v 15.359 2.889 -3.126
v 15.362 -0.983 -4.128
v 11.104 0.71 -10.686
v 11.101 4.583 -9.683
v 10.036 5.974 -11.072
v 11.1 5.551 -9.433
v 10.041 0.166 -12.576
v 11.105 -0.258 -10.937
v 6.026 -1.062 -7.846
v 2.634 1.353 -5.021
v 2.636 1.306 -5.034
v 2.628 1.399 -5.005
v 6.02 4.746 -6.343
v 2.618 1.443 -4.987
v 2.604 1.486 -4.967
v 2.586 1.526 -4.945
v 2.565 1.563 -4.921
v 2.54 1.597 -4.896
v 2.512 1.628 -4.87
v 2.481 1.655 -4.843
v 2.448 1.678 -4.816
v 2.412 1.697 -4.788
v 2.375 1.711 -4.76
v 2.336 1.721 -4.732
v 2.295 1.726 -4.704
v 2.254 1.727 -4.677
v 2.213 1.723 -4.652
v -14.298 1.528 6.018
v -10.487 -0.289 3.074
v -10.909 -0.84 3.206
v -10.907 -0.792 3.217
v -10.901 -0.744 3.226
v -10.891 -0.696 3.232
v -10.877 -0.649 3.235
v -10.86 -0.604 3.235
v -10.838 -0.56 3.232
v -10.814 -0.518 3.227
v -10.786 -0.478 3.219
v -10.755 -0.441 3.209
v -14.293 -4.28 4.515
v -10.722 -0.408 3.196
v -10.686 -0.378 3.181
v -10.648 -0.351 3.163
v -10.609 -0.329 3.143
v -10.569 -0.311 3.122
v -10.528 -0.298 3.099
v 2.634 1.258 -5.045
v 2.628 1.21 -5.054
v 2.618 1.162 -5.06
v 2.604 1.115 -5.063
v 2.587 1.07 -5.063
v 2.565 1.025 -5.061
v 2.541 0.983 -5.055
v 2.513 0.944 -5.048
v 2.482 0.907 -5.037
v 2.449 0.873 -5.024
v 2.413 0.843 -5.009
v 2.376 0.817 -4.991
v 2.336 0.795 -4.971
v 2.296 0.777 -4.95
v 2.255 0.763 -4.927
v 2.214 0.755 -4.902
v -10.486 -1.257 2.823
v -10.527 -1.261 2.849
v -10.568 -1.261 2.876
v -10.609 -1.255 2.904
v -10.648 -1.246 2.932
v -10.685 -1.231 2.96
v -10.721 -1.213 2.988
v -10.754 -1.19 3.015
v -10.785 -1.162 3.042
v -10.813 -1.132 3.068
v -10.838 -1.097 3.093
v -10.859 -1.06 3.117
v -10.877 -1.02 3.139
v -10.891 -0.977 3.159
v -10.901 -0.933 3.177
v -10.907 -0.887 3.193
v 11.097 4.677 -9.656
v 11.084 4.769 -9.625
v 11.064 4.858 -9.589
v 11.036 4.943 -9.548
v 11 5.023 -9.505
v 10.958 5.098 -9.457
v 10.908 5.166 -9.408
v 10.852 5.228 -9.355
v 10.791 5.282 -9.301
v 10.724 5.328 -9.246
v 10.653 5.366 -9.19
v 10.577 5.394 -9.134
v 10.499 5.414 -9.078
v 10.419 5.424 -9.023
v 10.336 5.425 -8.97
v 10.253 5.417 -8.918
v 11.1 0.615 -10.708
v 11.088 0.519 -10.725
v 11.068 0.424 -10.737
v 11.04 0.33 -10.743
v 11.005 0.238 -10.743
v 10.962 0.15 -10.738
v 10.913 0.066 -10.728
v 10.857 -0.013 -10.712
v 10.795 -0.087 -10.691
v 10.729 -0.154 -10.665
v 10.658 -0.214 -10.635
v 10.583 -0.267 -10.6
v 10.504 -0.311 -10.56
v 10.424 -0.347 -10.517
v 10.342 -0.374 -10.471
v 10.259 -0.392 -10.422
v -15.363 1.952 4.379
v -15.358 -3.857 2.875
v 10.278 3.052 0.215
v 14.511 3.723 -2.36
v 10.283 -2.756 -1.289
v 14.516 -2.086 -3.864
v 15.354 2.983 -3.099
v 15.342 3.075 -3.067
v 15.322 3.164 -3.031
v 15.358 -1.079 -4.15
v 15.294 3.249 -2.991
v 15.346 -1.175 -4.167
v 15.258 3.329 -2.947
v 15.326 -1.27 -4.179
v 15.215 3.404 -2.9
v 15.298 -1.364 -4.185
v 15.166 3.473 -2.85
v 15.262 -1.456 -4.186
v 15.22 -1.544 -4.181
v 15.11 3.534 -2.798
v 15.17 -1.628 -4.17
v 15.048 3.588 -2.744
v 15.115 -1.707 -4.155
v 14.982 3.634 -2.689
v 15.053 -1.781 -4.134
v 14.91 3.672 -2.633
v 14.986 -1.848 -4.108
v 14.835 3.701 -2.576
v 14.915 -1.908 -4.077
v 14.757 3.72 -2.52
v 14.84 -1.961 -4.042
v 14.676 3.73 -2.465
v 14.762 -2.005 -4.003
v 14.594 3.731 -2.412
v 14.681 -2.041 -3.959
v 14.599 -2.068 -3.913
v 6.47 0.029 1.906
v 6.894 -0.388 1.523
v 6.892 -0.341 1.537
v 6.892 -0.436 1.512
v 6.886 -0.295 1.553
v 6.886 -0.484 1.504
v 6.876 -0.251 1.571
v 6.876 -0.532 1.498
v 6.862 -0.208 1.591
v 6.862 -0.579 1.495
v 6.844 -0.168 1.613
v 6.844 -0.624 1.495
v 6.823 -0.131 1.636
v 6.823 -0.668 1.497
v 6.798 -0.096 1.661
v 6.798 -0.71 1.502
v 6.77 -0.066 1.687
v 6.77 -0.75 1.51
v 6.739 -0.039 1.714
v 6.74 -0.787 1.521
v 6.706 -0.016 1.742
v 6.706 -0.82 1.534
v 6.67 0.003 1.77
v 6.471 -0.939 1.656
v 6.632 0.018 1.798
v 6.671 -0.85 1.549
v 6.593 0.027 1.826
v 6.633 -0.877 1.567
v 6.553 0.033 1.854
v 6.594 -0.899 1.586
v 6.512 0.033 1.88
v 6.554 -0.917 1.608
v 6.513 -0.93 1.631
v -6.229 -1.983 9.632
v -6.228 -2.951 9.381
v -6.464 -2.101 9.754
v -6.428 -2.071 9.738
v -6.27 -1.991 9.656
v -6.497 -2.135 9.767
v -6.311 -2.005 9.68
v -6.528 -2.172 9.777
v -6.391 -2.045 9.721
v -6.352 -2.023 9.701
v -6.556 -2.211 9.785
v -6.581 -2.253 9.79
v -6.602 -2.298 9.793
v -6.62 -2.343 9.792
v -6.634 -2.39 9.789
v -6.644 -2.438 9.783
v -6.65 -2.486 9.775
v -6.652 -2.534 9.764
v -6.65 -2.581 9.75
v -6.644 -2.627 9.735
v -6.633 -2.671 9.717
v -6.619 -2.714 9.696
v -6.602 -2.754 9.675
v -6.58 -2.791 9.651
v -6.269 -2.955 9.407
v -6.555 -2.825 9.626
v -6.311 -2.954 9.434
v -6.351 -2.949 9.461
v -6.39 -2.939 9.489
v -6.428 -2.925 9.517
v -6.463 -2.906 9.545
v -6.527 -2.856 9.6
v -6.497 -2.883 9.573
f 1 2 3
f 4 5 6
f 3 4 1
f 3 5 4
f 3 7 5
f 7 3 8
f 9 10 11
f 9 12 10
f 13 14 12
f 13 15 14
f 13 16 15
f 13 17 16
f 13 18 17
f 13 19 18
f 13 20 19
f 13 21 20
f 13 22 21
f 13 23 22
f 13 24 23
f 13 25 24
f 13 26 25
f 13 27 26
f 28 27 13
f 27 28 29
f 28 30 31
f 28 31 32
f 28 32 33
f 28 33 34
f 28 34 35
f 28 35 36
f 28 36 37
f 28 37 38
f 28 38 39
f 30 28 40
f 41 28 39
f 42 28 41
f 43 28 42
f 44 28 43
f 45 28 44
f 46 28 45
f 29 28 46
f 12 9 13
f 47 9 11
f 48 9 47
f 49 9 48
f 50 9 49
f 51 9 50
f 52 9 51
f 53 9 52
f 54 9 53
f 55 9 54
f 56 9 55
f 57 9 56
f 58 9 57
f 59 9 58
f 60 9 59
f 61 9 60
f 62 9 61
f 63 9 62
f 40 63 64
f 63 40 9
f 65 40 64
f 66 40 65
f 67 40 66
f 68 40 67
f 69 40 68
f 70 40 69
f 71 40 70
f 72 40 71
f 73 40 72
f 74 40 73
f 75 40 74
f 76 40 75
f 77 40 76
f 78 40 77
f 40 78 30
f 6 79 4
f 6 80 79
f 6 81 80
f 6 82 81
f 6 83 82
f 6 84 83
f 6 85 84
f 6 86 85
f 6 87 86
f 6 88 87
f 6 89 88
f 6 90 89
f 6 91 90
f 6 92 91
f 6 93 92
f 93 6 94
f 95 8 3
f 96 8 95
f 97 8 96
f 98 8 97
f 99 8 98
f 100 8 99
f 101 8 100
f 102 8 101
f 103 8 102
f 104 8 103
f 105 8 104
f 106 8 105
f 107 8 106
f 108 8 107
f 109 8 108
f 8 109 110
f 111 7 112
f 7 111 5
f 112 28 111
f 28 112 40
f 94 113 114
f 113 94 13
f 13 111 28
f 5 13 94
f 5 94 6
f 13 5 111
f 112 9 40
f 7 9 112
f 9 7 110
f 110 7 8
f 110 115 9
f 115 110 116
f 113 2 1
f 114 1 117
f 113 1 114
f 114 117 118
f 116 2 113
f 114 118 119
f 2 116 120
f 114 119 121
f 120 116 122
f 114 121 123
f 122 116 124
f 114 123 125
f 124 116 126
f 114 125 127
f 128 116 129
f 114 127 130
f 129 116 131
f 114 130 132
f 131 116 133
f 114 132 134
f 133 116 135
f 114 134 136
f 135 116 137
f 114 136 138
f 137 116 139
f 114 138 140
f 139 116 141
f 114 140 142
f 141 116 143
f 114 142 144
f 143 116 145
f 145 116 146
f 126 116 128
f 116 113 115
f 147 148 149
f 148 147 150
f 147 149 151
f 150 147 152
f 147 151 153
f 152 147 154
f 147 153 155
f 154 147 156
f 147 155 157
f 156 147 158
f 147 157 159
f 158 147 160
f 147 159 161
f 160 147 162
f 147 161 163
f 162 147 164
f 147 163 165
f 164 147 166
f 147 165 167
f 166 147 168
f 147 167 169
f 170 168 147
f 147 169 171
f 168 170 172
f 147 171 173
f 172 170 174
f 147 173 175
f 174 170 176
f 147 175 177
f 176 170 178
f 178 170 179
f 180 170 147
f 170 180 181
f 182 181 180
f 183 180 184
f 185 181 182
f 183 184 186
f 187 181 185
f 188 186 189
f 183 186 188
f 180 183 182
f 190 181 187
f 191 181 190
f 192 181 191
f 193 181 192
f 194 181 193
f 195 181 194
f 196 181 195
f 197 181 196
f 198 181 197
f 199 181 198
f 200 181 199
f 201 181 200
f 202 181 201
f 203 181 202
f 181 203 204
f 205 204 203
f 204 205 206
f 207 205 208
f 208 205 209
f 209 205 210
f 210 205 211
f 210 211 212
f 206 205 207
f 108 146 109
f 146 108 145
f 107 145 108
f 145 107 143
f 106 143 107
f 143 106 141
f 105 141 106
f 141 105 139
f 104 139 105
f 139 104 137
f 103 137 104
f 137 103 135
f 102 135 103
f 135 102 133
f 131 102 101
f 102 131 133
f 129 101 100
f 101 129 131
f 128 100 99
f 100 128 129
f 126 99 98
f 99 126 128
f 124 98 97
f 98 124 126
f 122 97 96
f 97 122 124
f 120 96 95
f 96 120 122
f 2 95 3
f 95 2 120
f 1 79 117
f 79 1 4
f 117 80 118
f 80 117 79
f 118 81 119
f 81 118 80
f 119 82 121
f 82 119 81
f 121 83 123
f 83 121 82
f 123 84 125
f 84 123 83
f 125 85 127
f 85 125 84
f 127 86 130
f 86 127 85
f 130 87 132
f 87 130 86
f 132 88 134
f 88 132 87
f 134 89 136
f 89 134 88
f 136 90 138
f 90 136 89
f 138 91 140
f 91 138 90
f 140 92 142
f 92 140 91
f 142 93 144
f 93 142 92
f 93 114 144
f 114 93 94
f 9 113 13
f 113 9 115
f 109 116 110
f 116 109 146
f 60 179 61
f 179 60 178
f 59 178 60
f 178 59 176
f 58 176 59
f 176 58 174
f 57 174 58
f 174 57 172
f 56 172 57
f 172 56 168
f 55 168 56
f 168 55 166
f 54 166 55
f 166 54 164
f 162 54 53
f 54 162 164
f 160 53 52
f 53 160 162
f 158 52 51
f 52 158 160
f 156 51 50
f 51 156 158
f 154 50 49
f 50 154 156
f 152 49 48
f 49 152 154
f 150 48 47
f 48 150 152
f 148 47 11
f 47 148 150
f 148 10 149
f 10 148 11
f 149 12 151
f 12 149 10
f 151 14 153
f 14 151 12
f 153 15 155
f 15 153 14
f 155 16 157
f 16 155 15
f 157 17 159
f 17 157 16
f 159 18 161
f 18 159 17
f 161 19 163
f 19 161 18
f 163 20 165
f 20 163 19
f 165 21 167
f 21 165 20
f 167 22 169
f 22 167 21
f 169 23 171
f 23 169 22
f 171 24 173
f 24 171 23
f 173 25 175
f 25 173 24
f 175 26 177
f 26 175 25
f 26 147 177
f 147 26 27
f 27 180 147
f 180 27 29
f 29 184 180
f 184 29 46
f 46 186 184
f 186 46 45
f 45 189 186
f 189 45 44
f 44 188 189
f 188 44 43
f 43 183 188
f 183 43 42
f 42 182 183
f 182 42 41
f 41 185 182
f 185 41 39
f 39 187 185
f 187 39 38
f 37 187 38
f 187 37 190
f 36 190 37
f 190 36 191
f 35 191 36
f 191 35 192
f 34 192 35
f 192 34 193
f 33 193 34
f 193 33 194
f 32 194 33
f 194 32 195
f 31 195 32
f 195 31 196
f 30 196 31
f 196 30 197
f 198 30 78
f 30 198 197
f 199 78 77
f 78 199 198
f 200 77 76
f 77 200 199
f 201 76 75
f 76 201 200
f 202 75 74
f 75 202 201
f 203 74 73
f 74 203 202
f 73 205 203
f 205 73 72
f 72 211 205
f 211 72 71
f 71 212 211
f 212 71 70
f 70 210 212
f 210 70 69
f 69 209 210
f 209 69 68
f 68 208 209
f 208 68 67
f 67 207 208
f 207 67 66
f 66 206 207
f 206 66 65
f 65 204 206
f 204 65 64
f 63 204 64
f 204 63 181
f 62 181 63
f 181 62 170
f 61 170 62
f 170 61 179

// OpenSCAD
// file: stepped_bar.scad
// Lower bar is rectangular; the head's two free-end corners round above it.
// Rib x bounds are its OUTER stadium bounds, including both half-round ends.
$fn = 64;
body_length = 30;
body_width = 6;
head_length = 6;
step_1_height = 2;
step_2_height = 10;
corner_1_radius = 1;
corner_2_radius = 1;
corner_3_radius = 0.5;
corner_4_radius = 0.5;
rib_start = 4;
rib_end = 20;

module stepped_bar(body_length=30, body_width=6, head_length=6,
                    step_1_height=2, step_2_height=10,
                    corner_1_radius=1, corner_2_radius=1,
                    corner_3_radius=0.5, corner_4_radius=0.5,
                    rib_start=4, rib_end=20) {
    r1=corner_1_radius; r2=corner_2_radius;
    q1=corner_3_radius; q2=corner_4_radius;
    assert(0<step_1_height && step_1_height<step_2_height);
    assert(min(body_length,body_width,head_length,r1,r2,q1,q2)>0);
    assert(max(r1,r2)<min(head_length,body_width/2));
    assert(rib_start>0 && rib_end<body_length-head_length);
    assert(q1+q2<rib_end-rib_start && 2*max(q1,q2)<body_width);
    union() {
        cube([body_length,body_width,step_1_height]);
        translate([0,0,step_1_height]) linear_extrude(height=step_2_height-step_1_height) {
            // Head: square west end and rounded east end.
            hull() {
                translate([body_length-head_length,0]) square([head_length-max(r1,r2),body_width]);
                translate([body_length-r1,r1]) circle(r=r1);
                translate([body_length-r2,body_width-r2]) circle(r=r2);
            }
            // Stadium: centers one radius in from the specified outer bounds.
            hull() {
                translate([rib_start+q1,body_width/2]) circle(r=q1);
                translate([rib_end-q2,body_width/2]) circle(r=q2);
            }
        }
    }
}

stepped_bar(body_length,body_width,head_length,step_1_height,step_2_height,
    corner_1_radius,corner_2_radius,corner_3_radius,corner_4_radius,rib_start,rib_end);
// main file
use <stepped_bar.scad>
$fn = 16;
body_length = 30;
body_width = 6;
head_length = 6;
step_1_height = 2;
step_2_height = 10;
corner_1_radius = 1;
corner_2_radius = 1;
corner_3_radius = 0.5;
corner_4_radius = 0.5;
rib_start = 4;
rib_end = 20;

rotate([17,31,9]) translate([-body_length/2,-body_width/2,-step_2_height/2])
    stepped_bar(body_length,body_width,head_length,step_1_height,step_2_height,
        corner_1_radius,corner_2_radius,corner_3_radius,corner_4_radius,rib_start,rib_end);
